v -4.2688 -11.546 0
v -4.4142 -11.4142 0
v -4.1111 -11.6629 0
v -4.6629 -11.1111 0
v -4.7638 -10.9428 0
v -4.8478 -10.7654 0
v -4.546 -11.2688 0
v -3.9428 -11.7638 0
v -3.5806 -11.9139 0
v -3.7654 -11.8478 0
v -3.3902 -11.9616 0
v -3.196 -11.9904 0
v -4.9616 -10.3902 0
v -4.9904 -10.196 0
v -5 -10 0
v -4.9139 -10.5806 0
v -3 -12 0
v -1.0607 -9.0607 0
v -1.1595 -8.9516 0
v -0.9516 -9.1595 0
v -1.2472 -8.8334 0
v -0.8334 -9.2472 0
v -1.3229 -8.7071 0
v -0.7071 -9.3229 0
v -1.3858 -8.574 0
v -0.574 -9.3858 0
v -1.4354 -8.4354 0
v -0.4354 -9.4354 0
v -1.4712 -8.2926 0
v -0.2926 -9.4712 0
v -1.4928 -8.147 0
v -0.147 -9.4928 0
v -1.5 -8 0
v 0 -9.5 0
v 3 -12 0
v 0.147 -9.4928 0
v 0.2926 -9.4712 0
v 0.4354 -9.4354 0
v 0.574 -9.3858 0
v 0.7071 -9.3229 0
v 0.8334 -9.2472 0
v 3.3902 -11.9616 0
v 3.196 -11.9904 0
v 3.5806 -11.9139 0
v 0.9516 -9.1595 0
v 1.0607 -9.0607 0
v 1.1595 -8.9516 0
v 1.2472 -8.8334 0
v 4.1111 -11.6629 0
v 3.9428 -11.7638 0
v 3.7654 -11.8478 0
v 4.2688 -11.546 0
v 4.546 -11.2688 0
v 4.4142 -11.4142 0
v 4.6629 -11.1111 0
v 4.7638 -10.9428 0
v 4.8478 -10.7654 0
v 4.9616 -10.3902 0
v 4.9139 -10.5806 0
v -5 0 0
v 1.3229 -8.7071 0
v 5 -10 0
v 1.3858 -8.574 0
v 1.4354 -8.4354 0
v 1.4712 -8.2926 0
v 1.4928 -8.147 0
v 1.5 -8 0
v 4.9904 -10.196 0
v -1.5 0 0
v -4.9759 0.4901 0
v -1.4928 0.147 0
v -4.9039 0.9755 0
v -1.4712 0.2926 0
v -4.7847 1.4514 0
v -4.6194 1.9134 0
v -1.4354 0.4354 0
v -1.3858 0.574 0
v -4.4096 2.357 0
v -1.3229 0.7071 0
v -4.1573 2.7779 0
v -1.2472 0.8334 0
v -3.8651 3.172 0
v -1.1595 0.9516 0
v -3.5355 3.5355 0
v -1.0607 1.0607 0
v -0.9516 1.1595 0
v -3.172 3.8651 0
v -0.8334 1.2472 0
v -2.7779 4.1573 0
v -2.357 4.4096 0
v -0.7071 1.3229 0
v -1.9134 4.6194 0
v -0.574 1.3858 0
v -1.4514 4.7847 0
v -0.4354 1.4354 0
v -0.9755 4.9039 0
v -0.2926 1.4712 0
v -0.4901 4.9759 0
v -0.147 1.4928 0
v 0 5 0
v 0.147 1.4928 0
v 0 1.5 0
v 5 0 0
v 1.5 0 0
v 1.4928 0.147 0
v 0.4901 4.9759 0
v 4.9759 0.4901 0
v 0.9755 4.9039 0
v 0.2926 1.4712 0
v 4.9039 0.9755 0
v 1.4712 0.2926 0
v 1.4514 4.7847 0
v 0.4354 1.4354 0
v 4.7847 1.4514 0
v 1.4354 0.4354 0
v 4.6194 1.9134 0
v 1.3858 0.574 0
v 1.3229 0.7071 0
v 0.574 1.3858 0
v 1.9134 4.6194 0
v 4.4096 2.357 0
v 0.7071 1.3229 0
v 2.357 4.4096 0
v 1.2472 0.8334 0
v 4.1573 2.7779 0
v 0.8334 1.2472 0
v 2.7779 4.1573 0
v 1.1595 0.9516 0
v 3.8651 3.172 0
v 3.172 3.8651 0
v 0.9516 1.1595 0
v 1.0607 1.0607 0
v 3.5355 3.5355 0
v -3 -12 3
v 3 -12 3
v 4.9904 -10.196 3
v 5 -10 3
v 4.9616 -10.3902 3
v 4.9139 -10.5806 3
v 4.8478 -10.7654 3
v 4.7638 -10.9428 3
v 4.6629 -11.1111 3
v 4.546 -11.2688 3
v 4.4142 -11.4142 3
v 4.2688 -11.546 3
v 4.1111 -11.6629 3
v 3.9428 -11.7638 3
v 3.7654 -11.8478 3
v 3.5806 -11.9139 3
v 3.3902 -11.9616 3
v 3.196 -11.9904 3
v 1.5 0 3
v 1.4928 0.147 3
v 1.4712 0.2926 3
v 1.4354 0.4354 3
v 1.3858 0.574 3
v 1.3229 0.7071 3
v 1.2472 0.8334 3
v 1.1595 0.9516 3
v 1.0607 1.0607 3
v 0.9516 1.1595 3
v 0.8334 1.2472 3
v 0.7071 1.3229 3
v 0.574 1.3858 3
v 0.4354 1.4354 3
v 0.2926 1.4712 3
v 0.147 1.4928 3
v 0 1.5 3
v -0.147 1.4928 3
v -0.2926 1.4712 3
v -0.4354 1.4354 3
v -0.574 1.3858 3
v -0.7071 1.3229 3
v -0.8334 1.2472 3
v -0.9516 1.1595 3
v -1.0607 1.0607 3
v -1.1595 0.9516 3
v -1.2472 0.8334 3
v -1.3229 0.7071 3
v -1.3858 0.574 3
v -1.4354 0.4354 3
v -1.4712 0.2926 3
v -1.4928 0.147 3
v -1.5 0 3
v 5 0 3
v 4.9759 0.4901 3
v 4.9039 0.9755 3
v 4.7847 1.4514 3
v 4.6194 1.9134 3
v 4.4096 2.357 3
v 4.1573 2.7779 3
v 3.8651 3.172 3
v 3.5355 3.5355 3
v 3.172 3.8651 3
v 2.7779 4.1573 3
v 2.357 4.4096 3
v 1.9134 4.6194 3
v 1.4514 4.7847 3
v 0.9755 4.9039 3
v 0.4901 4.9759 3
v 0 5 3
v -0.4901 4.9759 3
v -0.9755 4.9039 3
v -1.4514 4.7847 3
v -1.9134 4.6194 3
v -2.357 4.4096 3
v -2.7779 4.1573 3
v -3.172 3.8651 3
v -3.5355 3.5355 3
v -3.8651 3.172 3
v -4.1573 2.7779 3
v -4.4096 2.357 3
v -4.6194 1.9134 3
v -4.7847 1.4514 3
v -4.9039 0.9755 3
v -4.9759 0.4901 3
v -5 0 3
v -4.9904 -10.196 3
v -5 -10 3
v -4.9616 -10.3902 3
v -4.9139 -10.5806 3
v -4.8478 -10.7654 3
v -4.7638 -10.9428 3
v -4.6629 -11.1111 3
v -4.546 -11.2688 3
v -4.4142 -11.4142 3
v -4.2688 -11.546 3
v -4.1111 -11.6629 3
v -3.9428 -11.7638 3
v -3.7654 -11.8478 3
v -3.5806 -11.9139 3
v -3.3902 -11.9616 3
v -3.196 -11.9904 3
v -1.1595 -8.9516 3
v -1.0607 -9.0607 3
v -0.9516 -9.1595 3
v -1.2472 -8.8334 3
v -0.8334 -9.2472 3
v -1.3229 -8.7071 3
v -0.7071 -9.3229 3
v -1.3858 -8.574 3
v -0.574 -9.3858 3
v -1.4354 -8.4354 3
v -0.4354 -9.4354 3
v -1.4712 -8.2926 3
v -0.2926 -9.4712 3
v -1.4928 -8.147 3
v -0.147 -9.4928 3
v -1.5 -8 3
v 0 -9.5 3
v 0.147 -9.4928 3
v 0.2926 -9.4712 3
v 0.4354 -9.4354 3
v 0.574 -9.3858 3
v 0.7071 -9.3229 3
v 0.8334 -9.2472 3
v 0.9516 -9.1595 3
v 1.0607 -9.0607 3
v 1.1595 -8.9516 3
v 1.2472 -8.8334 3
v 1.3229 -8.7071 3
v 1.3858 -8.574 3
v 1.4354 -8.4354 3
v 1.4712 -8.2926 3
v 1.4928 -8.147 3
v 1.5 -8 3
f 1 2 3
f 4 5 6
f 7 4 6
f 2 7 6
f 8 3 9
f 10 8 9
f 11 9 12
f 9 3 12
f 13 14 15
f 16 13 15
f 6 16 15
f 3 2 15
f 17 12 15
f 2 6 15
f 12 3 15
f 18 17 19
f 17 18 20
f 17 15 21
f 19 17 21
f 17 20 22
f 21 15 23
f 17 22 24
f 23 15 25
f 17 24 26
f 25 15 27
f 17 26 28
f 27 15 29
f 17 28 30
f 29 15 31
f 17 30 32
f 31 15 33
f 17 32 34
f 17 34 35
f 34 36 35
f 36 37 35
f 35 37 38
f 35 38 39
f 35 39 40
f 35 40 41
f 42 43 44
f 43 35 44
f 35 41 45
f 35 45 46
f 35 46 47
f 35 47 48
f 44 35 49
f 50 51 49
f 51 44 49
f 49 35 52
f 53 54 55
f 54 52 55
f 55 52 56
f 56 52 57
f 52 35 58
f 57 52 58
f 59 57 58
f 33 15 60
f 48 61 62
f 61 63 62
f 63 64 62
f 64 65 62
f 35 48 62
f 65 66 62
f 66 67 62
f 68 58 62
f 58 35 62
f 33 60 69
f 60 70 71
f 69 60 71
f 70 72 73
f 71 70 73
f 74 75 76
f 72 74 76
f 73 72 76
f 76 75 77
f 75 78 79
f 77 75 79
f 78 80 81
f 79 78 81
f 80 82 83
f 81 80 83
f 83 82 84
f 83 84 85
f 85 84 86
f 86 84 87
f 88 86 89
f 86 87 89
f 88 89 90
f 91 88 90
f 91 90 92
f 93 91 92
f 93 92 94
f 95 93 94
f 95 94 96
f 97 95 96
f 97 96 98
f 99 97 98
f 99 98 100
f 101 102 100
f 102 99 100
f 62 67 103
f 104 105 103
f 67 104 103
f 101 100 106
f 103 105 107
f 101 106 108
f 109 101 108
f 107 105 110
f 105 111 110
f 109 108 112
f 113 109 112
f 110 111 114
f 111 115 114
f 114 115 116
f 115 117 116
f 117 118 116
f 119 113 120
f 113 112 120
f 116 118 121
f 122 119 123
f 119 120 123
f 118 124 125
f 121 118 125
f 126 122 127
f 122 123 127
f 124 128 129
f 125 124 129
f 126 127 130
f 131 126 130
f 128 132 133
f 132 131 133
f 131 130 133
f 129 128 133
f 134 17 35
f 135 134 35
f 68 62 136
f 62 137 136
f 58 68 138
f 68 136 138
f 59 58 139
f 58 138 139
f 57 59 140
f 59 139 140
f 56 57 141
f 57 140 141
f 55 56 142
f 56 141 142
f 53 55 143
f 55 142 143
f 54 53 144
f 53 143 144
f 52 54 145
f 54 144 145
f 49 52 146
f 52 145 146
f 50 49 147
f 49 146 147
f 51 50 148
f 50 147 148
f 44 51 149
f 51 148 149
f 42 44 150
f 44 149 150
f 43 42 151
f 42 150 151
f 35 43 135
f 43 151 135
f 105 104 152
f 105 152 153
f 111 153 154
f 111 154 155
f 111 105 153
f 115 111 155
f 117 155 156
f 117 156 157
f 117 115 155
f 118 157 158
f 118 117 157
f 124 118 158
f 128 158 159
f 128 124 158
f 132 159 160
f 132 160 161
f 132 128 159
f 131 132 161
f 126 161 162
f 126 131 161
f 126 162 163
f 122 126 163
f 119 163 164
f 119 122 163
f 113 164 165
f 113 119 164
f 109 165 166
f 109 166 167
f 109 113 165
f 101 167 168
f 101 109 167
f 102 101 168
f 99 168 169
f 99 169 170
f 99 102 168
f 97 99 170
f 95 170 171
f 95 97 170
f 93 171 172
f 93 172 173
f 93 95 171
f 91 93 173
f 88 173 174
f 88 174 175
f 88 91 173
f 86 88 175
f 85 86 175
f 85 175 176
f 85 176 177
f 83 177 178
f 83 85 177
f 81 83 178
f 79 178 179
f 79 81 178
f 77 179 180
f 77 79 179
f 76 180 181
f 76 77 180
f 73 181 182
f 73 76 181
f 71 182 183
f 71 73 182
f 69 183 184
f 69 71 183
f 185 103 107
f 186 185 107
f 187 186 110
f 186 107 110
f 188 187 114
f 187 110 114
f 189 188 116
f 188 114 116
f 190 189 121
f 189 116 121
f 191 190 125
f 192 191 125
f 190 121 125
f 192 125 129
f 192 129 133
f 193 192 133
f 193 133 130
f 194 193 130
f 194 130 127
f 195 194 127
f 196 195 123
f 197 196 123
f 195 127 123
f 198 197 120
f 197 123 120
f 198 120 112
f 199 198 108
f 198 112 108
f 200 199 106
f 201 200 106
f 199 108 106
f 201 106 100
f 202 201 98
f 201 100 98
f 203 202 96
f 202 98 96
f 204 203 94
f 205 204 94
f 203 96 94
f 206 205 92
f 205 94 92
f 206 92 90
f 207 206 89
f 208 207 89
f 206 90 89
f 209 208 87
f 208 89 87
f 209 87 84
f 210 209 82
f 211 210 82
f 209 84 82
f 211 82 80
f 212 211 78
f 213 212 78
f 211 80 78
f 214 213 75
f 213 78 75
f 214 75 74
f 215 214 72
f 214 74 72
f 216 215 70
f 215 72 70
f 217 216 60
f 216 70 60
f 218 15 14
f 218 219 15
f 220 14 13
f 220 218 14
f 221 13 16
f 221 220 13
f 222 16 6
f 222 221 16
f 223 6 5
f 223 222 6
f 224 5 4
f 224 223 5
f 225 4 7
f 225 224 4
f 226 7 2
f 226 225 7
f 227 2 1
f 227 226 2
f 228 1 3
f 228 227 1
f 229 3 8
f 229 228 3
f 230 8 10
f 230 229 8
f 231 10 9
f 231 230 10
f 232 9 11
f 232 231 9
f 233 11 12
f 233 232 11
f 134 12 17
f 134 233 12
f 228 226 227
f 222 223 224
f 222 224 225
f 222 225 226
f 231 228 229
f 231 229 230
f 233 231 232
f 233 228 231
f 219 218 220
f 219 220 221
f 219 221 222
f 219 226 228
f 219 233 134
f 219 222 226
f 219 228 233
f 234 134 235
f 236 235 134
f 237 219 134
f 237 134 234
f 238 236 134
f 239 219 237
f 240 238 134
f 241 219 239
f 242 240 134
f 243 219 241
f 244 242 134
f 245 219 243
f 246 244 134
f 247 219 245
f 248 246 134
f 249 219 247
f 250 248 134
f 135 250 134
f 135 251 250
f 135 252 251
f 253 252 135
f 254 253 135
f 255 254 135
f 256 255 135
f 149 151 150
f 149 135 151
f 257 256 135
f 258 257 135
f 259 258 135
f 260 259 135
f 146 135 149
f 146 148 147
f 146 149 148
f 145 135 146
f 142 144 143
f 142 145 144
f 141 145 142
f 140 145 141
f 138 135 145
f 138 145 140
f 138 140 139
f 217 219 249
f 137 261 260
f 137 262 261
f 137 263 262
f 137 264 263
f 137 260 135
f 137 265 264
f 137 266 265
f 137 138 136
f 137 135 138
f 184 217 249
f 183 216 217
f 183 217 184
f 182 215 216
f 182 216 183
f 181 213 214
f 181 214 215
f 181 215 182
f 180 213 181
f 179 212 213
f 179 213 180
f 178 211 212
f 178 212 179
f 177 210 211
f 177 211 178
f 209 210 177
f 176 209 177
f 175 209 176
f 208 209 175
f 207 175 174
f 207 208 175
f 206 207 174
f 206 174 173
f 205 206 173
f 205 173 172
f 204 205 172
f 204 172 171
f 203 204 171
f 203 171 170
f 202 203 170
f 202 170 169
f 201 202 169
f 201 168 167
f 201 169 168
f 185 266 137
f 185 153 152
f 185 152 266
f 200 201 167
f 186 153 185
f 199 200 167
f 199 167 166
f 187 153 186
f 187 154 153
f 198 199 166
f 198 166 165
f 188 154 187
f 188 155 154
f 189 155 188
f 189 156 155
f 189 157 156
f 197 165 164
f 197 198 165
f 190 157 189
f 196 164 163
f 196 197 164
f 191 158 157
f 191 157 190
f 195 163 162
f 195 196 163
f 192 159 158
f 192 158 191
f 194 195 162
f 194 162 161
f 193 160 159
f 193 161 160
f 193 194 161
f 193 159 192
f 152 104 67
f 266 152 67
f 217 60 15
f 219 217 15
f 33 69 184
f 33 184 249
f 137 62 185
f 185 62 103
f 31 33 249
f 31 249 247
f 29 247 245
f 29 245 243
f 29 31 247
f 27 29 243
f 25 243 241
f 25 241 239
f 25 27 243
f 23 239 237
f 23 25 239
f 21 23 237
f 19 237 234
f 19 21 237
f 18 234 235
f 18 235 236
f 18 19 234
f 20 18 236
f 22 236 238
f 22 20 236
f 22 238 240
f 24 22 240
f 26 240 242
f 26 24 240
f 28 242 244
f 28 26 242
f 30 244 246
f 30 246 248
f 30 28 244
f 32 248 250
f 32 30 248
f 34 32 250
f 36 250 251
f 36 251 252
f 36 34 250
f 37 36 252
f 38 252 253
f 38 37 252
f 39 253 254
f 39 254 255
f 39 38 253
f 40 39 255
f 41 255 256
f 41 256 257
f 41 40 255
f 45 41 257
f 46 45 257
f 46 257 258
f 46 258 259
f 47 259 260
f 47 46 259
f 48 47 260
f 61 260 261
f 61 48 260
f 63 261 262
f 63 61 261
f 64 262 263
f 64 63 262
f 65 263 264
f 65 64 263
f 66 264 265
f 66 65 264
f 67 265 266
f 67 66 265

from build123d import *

# Parameters (mm, degrees)
PAD_DEPTH = 3
FILLET_R  = 2


with BuildPart() as part:
    # Sketch → Pad (new body)
    with BuildSketch(Plane.XY):
        with BuildLine():
            ThreePointArc((5, 0), (0, 5), (-5, 0))
            Line((-5, 0), (-5, -12))
            Line((-5, -12), (5, -12))
            Line((5, -12), (5, 0))
        make_face()
        with BuildLine():
            ThreePointArc((1.5, 0), (0, 1.5), (-1.5, 0))
            Line((-1.5, 0), (-1.5, -8))
            ThreePointArc((-1.5, -8), (0, -9.5), (1.5, -8))
            Line((1.5, 0), (1.5, -8))
        make_face(mode=Mode.SUBTRACT)
    extrude(amount=PAD_DEPTH)

    # Fillet
    fillet_edges = [part.edges().sort_by_distance(p)[0] for p in [
        (-5, -12, 1.5),
        (5, -12, 1.5),
    ]]
    fillet(fillet_edges, radius=FILLET_R)


solid = part.part
